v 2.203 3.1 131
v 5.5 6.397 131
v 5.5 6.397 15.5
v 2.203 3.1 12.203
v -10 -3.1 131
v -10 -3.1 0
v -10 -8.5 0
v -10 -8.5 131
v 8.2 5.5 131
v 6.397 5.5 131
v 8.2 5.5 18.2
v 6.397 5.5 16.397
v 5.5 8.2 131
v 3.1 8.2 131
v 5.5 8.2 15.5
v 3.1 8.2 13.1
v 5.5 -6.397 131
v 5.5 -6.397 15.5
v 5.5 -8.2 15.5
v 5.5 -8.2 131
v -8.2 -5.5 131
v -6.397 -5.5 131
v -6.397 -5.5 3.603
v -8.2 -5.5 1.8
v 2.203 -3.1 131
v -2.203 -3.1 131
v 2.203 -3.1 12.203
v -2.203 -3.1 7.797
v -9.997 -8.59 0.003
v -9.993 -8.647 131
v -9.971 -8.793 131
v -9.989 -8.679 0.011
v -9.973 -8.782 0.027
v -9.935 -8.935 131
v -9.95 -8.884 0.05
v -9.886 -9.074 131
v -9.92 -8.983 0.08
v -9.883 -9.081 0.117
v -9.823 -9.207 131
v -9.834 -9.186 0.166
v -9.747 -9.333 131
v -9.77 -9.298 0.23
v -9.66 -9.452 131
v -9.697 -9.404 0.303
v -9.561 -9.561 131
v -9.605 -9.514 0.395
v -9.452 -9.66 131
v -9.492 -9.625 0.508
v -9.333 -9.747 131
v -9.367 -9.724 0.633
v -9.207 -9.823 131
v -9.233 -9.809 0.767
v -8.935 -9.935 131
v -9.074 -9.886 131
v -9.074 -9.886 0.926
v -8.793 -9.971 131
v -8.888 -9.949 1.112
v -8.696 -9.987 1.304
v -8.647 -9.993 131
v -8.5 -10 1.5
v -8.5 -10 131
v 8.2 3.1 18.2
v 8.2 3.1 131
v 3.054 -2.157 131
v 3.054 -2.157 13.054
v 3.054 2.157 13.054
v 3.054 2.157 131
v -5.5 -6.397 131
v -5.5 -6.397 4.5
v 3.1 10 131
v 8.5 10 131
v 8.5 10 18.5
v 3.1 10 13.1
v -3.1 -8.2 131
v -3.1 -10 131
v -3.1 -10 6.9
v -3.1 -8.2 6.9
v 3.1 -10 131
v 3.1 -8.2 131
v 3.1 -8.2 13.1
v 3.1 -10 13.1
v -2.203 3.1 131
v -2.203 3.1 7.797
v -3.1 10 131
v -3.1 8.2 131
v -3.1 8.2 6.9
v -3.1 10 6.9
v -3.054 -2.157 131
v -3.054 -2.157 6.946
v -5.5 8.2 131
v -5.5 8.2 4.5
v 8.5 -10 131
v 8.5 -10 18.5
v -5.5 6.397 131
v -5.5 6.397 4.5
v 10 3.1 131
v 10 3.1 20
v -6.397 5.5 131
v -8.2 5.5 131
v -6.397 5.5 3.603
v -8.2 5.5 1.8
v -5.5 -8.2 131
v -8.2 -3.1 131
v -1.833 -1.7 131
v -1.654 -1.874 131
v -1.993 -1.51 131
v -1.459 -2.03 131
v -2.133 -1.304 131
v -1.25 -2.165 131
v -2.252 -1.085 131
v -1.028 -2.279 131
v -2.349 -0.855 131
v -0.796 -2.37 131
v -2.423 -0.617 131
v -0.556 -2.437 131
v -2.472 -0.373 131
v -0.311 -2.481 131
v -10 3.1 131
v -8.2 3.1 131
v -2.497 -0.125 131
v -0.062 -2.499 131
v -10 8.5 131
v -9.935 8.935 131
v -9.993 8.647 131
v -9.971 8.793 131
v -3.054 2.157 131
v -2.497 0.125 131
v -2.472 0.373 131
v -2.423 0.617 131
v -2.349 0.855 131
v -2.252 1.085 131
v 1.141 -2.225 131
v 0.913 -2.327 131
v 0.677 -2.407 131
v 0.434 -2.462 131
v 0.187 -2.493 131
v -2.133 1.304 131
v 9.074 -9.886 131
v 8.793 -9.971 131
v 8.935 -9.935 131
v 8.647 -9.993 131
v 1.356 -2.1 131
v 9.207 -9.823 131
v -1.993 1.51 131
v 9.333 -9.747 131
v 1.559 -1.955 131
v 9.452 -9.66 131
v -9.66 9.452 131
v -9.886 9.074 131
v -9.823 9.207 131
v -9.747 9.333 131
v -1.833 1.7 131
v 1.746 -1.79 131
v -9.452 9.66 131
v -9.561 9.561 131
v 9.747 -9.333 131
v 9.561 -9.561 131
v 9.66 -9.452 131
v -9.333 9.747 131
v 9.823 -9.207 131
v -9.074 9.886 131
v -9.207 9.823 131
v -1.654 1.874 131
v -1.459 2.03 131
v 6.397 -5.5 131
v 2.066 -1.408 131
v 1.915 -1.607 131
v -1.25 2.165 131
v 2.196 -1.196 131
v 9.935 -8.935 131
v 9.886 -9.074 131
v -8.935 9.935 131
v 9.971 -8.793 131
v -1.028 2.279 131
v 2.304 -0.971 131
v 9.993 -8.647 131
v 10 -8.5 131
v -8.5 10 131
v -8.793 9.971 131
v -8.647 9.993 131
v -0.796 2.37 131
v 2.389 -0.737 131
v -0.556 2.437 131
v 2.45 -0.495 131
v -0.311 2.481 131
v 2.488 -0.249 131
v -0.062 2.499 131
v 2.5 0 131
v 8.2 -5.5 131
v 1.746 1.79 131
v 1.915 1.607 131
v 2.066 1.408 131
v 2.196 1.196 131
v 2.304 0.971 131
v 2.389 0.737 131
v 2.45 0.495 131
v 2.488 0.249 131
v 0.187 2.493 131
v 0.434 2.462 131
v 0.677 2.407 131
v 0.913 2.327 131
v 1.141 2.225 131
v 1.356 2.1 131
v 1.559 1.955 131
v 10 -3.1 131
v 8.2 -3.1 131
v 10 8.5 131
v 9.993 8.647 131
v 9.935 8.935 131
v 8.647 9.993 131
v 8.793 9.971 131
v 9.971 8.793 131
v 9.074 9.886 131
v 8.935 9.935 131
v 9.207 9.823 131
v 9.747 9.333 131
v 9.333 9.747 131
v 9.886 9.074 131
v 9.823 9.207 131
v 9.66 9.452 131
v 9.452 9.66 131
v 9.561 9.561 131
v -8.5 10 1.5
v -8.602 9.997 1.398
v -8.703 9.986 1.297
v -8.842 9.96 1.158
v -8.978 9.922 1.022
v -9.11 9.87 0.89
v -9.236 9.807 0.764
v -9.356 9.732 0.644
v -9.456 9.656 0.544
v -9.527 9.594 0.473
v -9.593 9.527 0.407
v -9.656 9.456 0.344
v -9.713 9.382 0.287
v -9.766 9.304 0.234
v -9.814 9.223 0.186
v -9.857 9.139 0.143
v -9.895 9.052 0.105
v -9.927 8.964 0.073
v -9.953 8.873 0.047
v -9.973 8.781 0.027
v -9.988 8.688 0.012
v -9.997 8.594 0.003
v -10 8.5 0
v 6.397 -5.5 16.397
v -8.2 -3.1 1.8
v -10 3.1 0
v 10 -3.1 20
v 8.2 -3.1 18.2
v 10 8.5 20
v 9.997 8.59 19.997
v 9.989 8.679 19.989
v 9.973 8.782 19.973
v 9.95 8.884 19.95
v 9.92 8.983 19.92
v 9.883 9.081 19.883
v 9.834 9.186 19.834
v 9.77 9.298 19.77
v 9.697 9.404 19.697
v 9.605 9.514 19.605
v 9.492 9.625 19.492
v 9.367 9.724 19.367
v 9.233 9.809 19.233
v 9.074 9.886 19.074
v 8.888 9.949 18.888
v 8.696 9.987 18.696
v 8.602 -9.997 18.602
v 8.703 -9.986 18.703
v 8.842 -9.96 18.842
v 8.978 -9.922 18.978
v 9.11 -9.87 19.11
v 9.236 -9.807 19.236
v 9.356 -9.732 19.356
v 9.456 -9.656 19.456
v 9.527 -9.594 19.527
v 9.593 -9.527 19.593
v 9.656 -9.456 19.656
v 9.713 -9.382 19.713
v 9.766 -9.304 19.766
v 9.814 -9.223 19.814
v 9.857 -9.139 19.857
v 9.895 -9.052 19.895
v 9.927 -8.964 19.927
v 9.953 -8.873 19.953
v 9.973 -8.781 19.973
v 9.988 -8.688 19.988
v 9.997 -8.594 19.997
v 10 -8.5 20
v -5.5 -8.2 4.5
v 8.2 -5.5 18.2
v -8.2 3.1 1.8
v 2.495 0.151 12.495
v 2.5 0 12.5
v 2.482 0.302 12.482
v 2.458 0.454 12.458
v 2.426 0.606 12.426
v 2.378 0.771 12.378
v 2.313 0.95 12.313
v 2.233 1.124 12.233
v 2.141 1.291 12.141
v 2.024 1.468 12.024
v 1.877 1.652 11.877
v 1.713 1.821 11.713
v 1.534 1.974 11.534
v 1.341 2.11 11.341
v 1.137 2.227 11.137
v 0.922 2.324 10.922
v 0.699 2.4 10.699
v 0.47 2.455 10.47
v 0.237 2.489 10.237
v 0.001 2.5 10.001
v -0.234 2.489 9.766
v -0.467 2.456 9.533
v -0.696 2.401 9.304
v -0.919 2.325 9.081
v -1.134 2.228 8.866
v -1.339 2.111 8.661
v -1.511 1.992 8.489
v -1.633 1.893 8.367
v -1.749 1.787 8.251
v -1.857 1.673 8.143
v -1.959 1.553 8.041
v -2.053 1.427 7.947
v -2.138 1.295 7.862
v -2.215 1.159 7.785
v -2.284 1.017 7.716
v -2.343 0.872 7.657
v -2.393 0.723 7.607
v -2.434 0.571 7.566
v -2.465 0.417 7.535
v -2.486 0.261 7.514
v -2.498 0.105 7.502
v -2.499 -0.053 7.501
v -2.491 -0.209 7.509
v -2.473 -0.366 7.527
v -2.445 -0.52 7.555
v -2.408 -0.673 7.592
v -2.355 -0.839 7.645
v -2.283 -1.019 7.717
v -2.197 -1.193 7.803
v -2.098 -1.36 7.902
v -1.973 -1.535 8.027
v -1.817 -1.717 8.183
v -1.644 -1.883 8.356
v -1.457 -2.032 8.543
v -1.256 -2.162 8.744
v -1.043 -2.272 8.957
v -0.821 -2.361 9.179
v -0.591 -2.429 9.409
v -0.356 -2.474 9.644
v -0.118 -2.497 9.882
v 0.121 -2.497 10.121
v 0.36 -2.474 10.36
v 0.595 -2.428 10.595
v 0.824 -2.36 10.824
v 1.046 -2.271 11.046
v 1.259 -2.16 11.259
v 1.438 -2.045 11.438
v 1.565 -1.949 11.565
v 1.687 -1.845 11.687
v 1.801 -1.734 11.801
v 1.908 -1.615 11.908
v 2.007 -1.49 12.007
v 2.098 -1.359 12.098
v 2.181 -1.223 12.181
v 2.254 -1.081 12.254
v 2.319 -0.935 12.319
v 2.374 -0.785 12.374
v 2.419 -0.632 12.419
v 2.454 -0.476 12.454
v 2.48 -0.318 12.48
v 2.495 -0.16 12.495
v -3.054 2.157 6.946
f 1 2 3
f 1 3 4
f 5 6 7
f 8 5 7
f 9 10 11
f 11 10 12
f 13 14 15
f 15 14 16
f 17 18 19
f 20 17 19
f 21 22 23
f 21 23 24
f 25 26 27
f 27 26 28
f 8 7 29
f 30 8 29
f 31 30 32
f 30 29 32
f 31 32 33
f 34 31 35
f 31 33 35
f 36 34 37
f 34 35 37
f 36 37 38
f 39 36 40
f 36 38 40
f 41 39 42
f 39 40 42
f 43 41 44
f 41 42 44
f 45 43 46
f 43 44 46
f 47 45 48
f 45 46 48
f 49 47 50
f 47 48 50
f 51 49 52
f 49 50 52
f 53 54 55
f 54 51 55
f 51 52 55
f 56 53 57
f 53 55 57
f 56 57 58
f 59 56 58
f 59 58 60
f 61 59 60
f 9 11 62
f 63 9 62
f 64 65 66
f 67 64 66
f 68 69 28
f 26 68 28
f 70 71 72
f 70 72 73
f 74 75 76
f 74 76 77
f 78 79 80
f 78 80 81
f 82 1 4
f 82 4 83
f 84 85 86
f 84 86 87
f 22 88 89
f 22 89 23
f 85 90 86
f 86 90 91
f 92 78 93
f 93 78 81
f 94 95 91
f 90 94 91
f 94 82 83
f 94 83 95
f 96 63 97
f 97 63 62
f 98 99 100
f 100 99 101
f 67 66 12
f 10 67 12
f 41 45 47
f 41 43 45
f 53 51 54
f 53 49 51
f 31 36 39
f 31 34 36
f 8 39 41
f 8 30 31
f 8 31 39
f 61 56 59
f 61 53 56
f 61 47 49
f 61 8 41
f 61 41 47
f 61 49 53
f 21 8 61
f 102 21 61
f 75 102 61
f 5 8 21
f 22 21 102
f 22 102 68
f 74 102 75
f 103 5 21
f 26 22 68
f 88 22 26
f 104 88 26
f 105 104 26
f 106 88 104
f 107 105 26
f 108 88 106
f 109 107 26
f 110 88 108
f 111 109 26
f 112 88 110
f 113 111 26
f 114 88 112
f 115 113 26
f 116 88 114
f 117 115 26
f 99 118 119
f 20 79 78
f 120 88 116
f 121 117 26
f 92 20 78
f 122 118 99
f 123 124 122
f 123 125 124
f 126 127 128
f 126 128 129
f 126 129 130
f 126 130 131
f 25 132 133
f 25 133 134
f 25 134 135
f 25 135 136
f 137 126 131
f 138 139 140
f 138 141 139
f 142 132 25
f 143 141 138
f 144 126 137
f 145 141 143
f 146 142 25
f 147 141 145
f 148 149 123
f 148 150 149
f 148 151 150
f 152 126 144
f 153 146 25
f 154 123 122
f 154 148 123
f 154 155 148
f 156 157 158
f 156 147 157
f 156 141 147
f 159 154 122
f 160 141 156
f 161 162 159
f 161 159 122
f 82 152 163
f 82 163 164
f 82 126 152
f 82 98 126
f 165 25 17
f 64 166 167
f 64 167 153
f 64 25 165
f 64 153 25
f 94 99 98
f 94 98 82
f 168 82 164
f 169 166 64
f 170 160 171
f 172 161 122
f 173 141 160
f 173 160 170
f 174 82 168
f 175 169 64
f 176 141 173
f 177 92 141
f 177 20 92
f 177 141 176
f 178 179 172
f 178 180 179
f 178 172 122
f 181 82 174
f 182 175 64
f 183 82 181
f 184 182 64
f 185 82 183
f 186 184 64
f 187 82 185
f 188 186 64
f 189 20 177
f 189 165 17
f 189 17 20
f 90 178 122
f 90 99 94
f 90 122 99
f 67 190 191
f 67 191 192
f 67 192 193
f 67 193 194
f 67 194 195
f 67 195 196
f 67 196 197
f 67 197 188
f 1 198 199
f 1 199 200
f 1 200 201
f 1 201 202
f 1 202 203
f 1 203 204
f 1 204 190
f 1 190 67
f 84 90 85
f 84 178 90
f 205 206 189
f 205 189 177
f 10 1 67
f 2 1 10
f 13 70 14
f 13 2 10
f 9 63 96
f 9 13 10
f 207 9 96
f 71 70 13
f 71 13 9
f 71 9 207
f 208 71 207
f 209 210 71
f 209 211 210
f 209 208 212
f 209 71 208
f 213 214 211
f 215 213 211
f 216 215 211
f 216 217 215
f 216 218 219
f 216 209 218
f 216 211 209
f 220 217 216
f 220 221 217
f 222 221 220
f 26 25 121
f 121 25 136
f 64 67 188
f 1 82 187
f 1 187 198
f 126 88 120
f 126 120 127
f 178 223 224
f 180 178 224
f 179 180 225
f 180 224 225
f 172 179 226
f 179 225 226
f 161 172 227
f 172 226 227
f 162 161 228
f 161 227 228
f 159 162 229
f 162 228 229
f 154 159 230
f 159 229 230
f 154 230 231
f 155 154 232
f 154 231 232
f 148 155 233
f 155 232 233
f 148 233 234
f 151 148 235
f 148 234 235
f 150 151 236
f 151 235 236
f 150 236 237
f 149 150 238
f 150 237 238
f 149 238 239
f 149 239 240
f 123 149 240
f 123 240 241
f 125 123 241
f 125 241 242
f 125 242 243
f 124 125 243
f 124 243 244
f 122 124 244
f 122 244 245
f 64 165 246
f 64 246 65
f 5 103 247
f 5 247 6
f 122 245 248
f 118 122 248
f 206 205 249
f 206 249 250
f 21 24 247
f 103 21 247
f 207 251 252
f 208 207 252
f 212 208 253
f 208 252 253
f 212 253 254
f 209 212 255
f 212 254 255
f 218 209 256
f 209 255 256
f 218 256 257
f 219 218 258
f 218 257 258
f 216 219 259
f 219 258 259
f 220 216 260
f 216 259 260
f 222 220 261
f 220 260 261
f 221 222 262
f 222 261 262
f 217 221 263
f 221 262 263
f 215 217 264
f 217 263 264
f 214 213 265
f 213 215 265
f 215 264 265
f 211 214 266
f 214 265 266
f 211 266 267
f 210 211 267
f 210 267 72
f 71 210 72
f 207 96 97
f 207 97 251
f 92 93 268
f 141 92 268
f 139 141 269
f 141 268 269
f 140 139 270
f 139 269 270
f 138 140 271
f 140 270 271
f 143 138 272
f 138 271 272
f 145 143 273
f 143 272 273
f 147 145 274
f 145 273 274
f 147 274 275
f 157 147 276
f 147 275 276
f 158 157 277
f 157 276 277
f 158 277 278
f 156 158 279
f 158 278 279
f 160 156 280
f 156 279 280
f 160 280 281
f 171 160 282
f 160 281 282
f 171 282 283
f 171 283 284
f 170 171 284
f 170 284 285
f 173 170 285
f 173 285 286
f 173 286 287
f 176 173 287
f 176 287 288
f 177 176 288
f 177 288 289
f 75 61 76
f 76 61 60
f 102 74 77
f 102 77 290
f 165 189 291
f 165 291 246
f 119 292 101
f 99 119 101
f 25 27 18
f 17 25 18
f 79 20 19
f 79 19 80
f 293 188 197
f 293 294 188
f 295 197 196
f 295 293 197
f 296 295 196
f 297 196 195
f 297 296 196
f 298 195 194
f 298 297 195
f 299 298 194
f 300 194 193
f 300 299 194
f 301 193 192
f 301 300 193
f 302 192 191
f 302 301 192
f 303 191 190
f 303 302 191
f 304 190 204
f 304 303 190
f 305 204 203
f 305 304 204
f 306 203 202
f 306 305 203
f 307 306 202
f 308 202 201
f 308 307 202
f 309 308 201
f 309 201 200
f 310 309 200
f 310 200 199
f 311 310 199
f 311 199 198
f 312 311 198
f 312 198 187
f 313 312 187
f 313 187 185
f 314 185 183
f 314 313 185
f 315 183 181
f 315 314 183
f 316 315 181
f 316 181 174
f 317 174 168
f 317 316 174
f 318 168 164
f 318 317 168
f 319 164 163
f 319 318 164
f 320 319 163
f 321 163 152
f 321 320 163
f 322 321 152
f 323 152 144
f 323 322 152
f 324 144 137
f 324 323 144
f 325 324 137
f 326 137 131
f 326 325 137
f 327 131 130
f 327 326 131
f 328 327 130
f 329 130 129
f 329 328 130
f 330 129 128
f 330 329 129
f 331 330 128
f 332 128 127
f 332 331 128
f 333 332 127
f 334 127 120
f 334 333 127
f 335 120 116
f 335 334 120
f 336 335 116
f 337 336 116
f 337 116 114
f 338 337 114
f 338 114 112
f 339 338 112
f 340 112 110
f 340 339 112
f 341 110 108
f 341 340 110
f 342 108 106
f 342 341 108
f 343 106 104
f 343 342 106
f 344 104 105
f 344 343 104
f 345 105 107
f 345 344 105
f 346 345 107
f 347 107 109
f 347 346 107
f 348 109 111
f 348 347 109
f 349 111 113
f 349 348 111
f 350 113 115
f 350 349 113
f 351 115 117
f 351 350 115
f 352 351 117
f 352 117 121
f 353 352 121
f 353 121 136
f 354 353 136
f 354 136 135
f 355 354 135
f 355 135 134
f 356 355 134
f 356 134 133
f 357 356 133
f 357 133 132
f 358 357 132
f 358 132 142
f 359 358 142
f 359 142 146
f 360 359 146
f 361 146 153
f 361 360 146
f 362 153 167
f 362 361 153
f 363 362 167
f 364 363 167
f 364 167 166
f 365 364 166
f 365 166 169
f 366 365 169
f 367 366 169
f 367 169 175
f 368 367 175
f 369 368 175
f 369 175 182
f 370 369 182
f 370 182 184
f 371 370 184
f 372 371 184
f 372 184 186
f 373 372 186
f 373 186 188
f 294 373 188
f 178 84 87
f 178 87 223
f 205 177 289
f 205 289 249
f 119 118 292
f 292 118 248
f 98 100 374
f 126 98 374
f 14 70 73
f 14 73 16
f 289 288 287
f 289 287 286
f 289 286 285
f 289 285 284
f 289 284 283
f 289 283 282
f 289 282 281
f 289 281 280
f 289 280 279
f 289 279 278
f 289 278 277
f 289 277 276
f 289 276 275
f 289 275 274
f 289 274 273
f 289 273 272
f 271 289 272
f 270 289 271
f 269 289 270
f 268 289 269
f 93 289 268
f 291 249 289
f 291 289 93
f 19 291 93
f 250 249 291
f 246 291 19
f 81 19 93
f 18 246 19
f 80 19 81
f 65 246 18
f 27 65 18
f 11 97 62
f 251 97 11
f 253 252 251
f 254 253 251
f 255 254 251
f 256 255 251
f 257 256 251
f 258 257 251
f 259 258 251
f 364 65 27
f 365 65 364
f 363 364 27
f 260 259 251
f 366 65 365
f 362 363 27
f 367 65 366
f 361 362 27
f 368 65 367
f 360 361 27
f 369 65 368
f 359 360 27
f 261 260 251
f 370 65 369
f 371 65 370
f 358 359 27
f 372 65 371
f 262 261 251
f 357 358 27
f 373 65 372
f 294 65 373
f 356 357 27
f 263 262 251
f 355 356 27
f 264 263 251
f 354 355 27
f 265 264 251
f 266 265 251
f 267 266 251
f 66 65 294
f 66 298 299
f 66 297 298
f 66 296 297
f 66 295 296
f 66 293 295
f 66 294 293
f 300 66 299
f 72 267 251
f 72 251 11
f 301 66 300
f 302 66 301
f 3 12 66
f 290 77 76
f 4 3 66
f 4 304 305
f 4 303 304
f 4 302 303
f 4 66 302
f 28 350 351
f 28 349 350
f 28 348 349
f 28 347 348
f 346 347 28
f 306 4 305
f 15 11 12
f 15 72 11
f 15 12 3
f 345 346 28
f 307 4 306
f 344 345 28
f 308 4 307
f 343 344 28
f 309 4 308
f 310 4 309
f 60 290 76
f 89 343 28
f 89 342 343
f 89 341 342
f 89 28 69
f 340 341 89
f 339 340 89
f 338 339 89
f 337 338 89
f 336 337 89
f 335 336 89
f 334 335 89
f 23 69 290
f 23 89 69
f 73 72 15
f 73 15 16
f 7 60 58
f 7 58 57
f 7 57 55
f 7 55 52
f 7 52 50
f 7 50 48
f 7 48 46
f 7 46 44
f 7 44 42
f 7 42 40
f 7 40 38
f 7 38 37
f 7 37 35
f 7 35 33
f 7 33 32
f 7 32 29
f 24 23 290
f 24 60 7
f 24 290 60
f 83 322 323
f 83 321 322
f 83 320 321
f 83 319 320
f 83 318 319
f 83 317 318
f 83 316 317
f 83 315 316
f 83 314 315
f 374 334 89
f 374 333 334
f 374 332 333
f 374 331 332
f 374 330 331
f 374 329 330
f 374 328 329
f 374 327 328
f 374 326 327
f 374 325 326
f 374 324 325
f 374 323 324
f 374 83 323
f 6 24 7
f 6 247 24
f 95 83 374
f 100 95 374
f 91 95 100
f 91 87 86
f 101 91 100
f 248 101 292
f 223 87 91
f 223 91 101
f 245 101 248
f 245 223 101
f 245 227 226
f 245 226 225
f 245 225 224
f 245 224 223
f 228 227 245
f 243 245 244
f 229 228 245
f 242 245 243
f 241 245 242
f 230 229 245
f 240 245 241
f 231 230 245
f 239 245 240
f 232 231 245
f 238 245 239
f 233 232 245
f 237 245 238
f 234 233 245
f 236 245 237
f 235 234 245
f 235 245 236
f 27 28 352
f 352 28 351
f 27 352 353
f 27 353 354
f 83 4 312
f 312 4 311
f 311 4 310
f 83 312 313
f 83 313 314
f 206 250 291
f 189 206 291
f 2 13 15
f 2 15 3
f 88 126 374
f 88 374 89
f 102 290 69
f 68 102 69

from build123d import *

# Parameters (mm, degrees)
SKETCH_1_R          = 2.5
EXTRUDE_1_DEPTH     = 371
CUT_EXTRUDE_1_DEPTH = 372.673243589
SKETCH_3_W          = 49.042761982
SKETCH_3_H          = 45.736729066
CUT_EXTRUDE_2_DEPTH = 240


with BuildPart() as part:
    # 草图1 → 凸台-拉伸1 (new body)
    with BuildSketch(Plane.XY):
        with BuildLine():
            Line((-8.2, -3.1), (-10, -3.1))
            Line((-10, -3.1), (-10, -8.5))
            ThreePointArc((-10, -8.5), (-9.560660172, -9.560660172), (-8.5, -10))
            Line((-8.5, -10), (-3.1, -10))
            Line((-3.1, -10), (-3.1, -8.2))
            Line((-3.1, -8.2), (-5.5, -8.2))
            Line((-5.5, -8.2), (-5.5, -6.397050155))
            Line((-5.5, -6.397050155), (-2.202949845, -3.1))
            Line((-2.202949845, -3.1), (2.202949845, -3.1))
            Line((2.202949845, -3.1), (5.5, -6.397050155))
            Line((5.5, -6.397050155), (5.5, -8.2))
            Line((5.5, -8.2), (3.1, -8.2))
            Line((3.1, -8.2), (3.1, -10))
            Line((3.1, -10), (8.5, -10))
            ThreePointArc((8.5, -10), (9.560660172, -9.560660172), (10, -8.5))
            Line((10, -8.5), (10, -3.1))
            Line((10, -3.1), (8.2, -3.1))
            Line((8.2, -3.1), (8.2, -5.5))
            Line((8.2, -5.5), (6.397050155, -5.5))
            Line((6.397050155, -5.5), (3.05412702, -2.157076865))
            Line((3.05412702, -2.157076865), (3.05412702, 2.157076865))
            Line((3.05412702, 2.157076865), (6.397050155, 5.5))
            Line((6.397050155, 5.5), (8.2, 5.5))
            Line((8.2, 5.5), (8.2, 3.1))
            Line((8.2, 3.1), (10, 3.1))
            Line((10, 3.1), (10, 8.5))
            ThreePointArc((10, 8.5), (9.560660172, 9.560660172), (8.5, 10))
            Line((8.5, 10), (3.1, 10))
            Line((3.1, 10), (3.1, 8.2))
            Line((3.1, 8.2), (5.5, 8.2))
            Line((5.5, 8.2), (5.5, 6.397050155))
            Line((5.5, 6.397050155), (2.202949845, 3.1))
            Line((2.202949845, 3.1), (-2.202949845, 3.1))
            Line((-2.202949845, 3.1), (-5.5, 6.397050155))
            Line((-5.5, 6.397050155), (-5.5, 8.2))
            Line((-5.5, 8.2), (-3.1, 8.2))
            Line((-3.1, 8.2), (-3.1, 10))
            Line((-3.1, 10), (-8.5, 10))
            ThreePointArc((-8.5, 10), (-9.560660172, 9.560660172), (-10, 8.5))
            Line((-10, 8.5), (-10, 3.1))
            Line((-10, 3.1), (-8.2, 3.1))
            Line((-8.2, 3.1), (-8.2, 5.5))
            Line((-8.2, 5.5), (-6.397050155, 5.5))
            Line((-6.397050155, 5.5), (-3.05412702, 2.157076865))
            Line((-3.05412702, 2.157076865), (-3.05412702, -2.157076865))
            Line((-3.05412702, -2.157076865), (-6.397050155, -5.5))
            Line((-6.397050155, -5.5), (-8.2, -5.5))
            Line((-8.2, -5.5), (-8.2, -3.1))
        make_face()
        Circle(SKETCH_1_R, mode=Mode.SUBTRACT)
    extrude(amount=EXTRUDE_1_DEPTH)

    # 草图2 → 切除-拉伸1 (cut, through all)
    with BuildSketch(Plane(origin=(0, 10, 0), x_dir=(1, 0, 0), z_dir=(0, 1, 0))):
        Polygon((10, 0), (10, -20), (-10, 0), align=None)
    extrude(amount=-CUT_EXTRUDE_1_DEPTH, mode=Mode.SUBTRACT)

    # 草图3 → 切除-拉伸2 (cut)
    with BuildSketch(Plane.XY.offset(371)):
        with Locations((9.560660172, -9.560660172)):
            Rectangle(SKETCH_3_W, SKETCH_3_H)
    extrude(amount=-CUT_EXTRUDE_2_DEPTH, mode=Mode.SUBTRACT)


solid = part.part
